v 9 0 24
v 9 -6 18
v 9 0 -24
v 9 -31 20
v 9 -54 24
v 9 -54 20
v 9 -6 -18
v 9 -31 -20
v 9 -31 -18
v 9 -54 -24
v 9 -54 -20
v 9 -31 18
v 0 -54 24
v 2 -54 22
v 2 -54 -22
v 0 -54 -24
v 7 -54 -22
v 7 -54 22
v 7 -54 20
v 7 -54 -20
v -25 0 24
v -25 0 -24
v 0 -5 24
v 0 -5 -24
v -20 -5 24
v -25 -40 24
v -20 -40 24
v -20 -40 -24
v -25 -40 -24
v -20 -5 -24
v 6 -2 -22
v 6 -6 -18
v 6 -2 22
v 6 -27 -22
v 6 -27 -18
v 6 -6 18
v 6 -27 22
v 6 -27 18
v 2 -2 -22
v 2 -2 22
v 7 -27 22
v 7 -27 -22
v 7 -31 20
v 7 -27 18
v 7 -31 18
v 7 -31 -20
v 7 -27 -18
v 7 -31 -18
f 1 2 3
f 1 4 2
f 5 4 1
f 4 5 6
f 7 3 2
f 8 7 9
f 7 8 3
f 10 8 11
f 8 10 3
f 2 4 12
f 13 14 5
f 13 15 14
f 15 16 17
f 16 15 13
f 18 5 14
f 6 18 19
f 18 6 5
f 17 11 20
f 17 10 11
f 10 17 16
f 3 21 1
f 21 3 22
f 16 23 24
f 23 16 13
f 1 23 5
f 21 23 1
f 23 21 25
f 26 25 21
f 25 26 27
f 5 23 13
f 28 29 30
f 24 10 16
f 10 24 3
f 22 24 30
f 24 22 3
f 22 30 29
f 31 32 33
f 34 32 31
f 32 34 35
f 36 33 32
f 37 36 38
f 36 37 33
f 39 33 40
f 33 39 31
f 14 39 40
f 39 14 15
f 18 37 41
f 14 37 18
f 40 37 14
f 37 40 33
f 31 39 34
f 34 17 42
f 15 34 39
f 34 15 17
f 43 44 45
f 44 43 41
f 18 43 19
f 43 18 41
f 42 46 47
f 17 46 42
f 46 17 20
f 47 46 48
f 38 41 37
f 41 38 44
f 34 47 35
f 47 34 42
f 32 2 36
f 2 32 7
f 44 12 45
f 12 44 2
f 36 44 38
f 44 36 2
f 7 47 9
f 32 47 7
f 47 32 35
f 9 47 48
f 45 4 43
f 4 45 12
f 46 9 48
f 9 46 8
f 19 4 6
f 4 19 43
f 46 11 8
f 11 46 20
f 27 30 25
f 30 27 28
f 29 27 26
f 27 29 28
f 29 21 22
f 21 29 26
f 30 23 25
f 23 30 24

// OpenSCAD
// Slide mount for HTC Vive lighthouses
// This uses the wall mounts that come with the vive

BuildShelfMount();

// in mm
shelfThickness = 20; // SET THIS to the thickness of the shelf the mount will slot onto
// How thick the underneath bit and connector is
clampThickness = 5;
// How far under the shelf it'll go
clampLength = 40;

// Thickness of the plastic around the bracket
surround = 2;

/* [Hidden] */
// Approximate size of the lighthouse wall brackets
bThickness = 5;
bWidth = 44;
bLength = 50;

module BaseClip(housingSurround=2){   
    
    // Mount around it
    housingOverlap = 4; // What it clips under
    housingThickness = (housingSurround * 2) + bThickness;
    housingWidth = (housingSurround * 2) + bWidth;
    housingLength = (housingSurround * 2) + bLength;
    
    translate([0, -(bWidth+(housingSurround*2))/2, 0]){        
        difference(){
            cube([housingThickness, housingWidth, housingLength]);
            translate([housingSurround, housingSurround, housingSurround]){
                cube([bThickness-1, bWidth, bLength+20]);
            }
            translate([housingSurround, housingSurround, housingSurround+25]){
                cube([bThickness, bWidth, bLength]);
            }
            translate([housingSurround, housingSurround+housingOverlap, housingSurround+housingOverlap]){
                cube([50, (bWidth - (housingOverlap * 2)), bLength+20]);
            }
            translate([housingSurround, housingSurround+(housingOverlap/2), housingSurround+housingOverlap+25]){
                cube([50, (bWidth - (housingOverlap)), bLength+20]);
            }
        }
    }
}

module BuildShelfMount(){
    rotate([90, 0, 0]){
        union(){
            BaseClip(surround);
            
            // This is the bit underneath the shelf
            translate([-(clampThickness+shelfThickness), -(bWidth+surround*2)/2, ]){
                cube([clampThickness, bWidth+surround*2, clampLength]);
            }
            // Connecting piece
            translate([-(clampThickness+shelfThickness), -(bWidth+surround*2)/2, ]){
                cube([clampThickness+shelfThickness, bWidth+surround*2, clampThickness]);
            }
        }
    }    
}
